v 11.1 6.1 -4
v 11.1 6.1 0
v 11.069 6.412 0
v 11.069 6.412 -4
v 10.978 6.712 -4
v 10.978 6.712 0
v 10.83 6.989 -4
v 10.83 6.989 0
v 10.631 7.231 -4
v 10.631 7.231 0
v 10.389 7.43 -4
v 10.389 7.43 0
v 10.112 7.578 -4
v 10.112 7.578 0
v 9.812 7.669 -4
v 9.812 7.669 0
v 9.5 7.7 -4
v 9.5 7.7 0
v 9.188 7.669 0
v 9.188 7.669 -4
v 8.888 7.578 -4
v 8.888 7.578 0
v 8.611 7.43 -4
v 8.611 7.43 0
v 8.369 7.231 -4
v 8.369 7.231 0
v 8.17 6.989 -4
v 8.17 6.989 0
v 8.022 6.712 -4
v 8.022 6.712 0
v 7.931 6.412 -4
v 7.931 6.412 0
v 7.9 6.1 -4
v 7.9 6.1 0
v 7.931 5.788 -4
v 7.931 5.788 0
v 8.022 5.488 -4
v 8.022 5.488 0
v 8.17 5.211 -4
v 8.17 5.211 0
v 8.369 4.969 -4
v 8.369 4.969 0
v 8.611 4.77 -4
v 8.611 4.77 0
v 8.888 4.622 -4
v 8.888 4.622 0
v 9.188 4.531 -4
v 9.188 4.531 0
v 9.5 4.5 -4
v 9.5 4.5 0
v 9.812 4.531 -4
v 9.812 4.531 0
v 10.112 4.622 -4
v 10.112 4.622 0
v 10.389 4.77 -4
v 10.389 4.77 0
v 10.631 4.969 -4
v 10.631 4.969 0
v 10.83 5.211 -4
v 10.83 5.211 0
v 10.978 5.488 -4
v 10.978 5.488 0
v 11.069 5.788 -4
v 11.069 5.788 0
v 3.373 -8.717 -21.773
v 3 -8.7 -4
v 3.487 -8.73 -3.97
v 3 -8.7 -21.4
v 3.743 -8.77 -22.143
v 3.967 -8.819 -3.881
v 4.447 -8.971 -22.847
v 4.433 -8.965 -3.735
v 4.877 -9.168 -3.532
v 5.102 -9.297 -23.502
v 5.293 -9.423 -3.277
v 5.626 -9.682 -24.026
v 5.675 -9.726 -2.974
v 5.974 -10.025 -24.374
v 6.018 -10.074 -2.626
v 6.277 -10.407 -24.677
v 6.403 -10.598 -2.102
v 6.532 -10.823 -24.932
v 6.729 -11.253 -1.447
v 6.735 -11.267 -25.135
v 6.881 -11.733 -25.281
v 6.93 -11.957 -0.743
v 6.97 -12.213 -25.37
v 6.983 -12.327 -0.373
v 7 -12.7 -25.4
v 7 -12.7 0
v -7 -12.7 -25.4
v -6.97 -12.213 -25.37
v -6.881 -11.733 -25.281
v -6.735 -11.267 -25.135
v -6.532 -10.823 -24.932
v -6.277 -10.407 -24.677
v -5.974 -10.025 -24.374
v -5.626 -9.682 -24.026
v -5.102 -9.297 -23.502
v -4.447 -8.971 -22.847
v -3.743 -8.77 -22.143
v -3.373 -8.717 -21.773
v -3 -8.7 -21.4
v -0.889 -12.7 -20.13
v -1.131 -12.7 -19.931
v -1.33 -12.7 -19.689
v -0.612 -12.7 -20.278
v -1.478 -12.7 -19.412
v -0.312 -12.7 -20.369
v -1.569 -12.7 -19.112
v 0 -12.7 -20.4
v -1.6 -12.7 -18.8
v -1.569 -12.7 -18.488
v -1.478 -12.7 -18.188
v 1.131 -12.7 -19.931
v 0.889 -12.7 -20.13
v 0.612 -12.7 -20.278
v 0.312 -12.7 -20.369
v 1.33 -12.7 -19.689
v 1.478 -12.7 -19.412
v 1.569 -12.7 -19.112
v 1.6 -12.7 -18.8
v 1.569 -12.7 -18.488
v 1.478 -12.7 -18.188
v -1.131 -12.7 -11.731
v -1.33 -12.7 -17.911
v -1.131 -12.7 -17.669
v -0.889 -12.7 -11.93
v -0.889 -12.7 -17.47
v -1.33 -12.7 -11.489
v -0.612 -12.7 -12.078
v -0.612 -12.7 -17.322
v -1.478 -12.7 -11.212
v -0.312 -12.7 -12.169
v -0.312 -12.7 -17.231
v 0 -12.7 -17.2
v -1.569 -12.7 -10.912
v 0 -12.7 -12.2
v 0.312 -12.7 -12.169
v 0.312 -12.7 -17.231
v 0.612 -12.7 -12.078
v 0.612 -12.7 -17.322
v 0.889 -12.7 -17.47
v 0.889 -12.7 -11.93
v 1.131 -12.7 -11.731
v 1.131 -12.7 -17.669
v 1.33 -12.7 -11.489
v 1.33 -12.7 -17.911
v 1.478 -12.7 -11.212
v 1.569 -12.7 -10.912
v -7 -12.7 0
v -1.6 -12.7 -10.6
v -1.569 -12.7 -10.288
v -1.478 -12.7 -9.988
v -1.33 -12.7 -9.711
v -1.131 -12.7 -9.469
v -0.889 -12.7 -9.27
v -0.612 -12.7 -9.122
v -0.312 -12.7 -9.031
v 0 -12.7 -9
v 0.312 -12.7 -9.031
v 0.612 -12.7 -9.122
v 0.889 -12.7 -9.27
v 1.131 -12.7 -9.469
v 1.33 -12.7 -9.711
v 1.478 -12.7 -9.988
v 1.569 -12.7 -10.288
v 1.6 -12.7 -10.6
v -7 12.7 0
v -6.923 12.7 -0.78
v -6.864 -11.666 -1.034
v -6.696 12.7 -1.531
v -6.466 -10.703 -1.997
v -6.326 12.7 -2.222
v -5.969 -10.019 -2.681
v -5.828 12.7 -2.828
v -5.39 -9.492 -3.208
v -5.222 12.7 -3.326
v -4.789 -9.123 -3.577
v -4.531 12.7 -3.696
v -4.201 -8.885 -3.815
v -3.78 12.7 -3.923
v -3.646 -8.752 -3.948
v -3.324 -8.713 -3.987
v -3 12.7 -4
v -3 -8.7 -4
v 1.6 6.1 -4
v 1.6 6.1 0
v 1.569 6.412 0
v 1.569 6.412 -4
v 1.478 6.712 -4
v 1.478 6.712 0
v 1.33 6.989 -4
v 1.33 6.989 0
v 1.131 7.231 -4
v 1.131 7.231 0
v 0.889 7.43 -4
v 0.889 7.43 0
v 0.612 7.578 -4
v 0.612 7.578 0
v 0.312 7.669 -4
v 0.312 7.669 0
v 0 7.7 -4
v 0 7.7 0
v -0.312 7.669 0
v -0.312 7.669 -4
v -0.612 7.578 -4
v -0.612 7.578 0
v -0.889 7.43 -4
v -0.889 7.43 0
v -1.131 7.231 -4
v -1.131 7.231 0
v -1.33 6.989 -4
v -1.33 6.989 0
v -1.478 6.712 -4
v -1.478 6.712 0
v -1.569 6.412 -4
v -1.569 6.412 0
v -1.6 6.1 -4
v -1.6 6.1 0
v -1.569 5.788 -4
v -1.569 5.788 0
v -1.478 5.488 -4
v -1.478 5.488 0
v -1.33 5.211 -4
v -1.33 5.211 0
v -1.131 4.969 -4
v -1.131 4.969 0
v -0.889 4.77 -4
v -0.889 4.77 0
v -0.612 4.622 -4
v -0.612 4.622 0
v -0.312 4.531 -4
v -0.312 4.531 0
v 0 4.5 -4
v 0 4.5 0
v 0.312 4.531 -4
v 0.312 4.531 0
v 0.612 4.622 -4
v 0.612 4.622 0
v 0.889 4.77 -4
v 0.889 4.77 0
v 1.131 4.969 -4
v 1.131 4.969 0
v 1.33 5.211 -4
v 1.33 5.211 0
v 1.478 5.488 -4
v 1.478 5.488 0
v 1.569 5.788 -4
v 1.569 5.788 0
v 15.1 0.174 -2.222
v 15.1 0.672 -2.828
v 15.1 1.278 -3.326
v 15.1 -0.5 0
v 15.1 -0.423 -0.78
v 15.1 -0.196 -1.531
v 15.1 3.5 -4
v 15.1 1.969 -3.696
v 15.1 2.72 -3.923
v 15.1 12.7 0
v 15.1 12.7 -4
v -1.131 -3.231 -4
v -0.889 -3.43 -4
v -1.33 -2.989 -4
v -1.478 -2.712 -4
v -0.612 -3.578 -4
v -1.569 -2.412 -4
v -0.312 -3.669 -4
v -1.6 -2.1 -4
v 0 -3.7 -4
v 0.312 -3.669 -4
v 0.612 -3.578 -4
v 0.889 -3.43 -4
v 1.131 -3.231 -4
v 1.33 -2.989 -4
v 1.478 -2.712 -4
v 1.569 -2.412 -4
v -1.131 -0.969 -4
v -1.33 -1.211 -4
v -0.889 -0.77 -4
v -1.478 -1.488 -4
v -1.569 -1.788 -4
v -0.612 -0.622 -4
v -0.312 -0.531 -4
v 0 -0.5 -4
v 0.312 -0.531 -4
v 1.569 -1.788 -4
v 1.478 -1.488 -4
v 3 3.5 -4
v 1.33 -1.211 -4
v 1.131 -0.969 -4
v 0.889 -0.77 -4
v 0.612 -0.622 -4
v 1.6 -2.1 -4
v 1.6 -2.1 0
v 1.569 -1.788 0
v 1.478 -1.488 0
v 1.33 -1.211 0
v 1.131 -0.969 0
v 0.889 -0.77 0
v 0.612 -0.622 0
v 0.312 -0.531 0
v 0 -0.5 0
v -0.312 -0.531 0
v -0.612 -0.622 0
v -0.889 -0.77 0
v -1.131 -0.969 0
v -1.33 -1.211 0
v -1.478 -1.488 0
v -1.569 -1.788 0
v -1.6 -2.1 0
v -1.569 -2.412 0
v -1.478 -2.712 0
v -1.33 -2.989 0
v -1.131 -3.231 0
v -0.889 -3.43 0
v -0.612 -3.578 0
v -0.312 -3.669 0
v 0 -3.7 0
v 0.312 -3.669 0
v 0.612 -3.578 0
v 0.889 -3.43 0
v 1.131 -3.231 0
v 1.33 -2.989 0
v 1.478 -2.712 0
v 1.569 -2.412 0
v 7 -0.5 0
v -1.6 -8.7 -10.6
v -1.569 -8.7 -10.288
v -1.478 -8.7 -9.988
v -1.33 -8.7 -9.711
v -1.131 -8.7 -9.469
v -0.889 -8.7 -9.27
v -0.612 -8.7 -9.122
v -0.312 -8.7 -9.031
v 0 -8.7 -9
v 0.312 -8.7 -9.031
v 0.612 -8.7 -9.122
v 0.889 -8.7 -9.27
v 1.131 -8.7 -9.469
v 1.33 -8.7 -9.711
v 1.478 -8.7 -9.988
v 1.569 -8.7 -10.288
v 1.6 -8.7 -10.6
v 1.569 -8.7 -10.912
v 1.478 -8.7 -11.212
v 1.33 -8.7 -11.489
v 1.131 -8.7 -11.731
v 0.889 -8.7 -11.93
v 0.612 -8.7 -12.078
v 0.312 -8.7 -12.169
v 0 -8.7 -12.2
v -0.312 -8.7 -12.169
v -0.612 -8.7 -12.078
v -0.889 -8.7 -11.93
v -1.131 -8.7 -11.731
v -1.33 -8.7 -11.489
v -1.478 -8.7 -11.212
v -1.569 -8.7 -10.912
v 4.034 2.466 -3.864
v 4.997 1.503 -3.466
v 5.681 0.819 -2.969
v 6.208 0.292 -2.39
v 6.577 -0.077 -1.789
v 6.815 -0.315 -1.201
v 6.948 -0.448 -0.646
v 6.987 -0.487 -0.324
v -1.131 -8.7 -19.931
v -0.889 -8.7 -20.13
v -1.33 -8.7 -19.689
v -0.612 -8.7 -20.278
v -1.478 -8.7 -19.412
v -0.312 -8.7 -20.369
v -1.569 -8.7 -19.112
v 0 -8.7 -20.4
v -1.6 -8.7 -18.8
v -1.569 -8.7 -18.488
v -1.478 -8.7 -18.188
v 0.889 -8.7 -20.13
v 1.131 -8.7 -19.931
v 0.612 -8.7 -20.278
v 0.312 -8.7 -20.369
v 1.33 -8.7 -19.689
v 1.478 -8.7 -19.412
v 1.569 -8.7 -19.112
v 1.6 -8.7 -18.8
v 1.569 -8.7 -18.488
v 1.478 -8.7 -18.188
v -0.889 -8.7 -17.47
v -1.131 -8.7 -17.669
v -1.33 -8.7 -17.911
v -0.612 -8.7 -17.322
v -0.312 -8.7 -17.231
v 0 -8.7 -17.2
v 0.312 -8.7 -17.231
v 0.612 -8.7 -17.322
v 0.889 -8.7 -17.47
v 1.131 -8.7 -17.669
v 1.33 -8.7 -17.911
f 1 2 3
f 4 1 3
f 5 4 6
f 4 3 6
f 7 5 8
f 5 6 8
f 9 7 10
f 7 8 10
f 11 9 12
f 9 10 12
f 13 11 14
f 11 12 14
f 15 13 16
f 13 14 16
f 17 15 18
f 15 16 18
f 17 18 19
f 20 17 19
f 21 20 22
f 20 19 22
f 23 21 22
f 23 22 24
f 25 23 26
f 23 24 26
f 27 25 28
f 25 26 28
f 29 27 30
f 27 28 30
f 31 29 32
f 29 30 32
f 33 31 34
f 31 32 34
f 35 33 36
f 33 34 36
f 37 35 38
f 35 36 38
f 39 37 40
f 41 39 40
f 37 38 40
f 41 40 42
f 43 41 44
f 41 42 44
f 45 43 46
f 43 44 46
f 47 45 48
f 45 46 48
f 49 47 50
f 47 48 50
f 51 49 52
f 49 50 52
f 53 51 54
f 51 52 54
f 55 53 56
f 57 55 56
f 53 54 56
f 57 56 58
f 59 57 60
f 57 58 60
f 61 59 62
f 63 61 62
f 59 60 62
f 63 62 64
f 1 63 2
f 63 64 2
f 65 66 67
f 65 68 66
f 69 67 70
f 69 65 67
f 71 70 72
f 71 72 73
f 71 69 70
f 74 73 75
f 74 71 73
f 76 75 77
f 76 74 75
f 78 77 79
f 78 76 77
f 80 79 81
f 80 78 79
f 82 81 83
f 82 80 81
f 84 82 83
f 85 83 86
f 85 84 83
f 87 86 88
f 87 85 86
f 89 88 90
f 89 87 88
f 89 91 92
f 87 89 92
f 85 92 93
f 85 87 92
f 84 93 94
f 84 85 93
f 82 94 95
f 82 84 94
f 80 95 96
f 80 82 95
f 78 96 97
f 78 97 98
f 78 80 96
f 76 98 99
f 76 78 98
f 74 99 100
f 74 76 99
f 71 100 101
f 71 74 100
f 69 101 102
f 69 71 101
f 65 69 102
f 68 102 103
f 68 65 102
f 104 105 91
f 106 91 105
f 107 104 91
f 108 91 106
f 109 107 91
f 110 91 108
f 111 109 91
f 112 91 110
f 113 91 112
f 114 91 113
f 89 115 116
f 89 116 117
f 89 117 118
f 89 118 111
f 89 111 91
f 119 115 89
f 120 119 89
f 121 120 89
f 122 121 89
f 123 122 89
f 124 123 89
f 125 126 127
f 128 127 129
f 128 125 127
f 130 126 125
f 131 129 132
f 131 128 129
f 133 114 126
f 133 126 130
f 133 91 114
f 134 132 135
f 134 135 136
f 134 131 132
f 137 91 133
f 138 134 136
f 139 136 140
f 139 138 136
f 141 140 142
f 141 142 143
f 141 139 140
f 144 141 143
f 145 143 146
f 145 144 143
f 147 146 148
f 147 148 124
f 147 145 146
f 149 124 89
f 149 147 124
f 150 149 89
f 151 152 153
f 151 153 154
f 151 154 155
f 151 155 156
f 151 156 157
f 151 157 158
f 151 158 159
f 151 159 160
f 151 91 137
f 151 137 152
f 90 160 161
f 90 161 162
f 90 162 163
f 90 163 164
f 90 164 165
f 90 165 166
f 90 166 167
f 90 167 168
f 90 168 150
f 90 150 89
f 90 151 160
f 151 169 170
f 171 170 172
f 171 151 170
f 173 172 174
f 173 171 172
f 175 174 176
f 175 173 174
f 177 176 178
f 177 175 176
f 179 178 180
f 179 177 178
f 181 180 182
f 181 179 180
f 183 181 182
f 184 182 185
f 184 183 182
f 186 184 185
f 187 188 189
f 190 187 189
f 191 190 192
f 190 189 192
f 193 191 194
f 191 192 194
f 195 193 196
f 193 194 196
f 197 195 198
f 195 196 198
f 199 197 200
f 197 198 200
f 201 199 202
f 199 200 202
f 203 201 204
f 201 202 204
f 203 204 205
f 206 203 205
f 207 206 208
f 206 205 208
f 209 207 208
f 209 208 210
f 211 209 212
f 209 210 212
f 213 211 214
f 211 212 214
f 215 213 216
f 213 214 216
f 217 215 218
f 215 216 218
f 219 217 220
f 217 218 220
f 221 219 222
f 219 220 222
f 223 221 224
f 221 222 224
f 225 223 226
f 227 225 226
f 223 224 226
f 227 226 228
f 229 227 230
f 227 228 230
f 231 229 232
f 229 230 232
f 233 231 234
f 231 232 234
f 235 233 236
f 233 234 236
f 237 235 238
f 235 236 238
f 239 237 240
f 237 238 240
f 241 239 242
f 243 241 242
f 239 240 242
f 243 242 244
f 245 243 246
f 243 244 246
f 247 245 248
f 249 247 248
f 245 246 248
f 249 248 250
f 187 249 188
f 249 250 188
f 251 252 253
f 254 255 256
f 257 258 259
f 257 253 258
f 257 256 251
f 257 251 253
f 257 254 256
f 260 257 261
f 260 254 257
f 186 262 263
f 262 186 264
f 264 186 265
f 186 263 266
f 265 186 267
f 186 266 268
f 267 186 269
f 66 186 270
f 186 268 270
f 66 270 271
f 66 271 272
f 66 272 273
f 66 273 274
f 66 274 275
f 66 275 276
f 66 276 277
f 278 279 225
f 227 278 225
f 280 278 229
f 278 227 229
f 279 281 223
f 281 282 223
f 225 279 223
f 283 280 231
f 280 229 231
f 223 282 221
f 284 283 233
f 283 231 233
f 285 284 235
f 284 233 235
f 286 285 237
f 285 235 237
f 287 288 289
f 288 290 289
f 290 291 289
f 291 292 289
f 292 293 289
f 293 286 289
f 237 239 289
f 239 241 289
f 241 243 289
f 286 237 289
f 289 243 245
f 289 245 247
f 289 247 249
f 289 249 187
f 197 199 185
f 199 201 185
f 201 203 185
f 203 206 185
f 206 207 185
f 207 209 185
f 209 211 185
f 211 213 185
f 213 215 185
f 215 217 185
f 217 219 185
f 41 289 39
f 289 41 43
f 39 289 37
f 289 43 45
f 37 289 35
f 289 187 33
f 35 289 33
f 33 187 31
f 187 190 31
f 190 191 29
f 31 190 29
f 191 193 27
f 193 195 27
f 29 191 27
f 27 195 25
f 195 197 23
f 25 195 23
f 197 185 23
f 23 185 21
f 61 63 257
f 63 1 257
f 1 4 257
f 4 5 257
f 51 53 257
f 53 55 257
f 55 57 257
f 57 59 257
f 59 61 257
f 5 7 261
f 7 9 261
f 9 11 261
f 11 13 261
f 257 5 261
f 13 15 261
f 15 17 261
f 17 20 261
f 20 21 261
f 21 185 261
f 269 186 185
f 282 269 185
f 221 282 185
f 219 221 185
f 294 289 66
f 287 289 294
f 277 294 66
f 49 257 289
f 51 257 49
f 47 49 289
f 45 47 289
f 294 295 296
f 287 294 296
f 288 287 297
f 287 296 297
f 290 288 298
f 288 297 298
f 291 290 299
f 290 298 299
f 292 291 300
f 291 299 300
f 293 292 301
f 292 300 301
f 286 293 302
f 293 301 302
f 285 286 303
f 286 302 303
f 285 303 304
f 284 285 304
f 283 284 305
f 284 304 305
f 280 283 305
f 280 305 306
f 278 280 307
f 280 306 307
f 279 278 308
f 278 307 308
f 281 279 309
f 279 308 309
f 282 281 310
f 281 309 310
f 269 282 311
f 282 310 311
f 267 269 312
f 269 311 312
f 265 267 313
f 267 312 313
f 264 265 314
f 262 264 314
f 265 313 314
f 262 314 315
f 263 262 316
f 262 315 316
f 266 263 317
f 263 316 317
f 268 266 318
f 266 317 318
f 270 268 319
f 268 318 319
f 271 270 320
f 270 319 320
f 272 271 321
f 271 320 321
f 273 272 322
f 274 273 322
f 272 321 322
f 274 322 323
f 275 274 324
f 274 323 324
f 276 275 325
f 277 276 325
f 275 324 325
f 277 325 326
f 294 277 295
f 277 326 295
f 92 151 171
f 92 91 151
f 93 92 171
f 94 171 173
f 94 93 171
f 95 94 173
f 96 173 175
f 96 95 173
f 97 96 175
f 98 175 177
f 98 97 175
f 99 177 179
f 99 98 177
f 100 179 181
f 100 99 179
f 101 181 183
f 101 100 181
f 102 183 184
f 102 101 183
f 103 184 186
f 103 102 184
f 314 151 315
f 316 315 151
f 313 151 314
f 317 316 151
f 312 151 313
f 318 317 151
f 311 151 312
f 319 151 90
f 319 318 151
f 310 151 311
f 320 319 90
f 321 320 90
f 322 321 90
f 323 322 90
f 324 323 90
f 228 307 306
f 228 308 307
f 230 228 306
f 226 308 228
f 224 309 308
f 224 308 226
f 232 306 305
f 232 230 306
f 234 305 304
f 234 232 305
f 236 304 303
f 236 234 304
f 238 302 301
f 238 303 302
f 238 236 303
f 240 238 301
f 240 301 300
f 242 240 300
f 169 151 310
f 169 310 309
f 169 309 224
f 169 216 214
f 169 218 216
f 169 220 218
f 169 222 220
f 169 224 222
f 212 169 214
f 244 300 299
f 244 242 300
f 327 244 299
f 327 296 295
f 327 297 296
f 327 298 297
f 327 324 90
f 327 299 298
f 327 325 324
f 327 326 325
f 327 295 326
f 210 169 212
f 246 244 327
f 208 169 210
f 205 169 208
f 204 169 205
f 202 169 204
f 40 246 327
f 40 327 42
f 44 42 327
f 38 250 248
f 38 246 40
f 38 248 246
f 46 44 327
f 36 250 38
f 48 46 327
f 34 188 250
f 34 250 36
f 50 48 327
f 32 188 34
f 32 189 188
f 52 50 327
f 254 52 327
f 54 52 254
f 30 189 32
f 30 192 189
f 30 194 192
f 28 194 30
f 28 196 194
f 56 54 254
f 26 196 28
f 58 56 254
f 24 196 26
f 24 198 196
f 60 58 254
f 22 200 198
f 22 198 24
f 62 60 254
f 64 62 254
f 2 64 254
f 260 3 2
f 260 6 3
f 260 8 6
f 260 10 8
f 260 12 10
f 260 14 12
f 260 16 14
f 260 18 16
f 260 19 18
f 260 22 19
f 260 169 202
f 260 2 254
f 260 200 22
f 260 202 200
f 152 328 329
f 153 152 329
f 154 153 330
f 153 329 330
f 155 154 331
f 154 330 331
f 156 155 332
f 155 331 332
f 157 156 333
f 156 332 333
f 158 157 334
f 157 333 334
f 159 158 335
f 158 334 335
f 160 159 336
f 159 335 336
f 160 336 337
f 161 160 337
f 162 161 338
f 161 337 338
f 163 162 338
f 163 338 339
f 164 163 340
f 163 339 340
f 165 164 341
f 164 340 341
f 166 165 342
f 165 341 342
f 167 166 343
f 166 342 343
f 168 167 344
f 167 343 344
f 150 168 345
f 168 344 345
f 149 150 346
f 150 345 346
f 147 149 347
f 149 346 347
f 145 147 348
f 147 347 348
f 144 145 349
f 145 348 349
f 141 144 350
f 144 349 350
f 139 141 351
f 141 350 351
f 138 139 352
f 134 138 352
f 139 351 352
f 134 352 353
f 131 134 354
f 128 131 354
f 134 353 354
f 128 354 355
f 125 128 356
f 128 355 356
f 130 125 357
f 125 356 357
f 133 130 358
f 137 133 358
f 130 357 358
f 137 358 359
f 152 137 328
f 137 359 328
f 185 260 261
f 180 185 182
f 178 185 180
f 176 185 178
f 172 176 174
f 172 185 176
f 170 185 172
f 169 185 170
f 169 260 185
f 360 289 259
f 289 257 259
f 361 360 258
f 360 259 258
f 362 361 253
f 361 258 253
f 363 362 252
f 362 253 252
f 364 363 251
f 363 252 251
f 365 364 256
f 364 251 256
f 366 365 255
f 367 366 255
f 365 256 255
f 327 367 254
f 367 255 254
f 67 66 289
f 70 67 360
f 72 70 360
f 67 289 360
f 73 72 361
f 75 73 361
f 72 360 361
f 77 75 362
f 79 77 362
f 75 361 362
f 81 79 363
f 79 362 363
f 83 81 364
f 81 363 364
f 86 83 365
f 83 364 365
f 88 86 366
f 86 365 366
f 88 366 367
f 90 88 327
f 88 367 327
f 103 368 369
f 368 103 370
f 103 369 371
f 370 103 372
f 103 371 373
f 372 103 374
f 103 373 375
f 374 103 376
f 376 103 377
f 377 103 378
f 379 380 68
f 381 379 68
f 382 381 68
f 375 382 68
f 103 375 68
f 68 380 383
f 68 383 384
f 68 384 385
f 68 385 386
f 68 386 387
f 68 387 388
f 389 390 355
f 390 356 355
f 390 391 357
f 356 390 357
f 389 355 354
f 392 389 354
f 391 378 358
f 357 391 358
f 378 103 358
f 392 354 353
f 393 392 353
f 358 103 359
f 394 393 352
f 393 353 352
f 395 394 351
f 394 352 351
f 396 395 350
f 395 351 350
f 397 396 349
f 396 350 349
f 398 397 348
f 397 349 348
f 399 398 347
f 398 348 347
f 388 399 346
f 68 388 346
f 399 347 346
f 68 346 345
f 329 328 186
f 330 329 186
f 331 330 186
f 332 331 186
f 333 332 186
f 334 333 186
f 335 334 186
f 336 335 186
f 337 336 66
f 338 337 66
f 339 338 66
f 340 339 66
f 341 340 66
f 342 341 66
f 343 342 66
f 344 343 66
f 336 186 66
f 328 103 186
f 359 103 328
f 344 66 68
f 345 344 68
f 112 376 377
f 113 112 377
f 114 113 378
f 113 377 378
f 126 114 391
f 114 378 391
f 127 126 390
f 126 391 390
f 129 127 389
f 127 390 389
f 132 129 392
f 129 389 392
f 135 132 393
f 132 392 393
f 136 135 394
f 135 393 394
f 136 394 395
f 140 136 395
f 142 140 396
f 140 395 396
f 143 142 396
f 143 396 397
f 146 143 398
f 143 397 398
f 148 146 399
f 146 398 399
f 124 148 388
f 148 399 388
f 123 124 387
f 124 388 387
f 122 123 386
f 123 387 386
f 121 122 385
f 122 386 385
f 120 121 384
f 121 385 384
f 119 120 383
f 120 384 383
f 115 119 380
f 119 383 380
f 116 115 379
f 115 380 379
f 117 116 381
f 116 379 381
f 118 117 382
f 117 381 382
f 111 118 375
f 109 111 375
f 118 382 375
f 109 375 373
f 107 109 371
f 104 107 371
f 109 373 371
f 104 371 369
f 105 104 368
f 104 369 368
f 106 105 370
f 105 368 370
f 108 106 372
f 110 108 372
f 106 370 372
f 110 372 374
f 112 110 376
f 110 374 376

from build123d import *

# Parameters (mm, degrees)
F0_R     = 1.6
F1_DEPTH = 4
F0_W     = 14
F0_H     = 4
F2_DEPTH = 25.4
F3_R     = 1.6
F4_DEPTH = 4
F5_R     = 3.99999


# Not quite as in the source:
# - a fillet or chamfer is up to 0.001 mm smaller than in the source, because OpenCascade refuses the exact size


with BuildPart() as f1:
    # F0 (on Top) → F1 (new body)
    with BuildSketch(Plane.XY):
        Polygon((7, 12.7), (-7, 12.7), (-7, -8.7), (7, -8.7), (7, -0.5), (15.1, -0.5), (15.1, 12.7), align=None)
        with Locations((0, -2.1)):
            Circle(F0_R, mode=Mode.SUBTRACT)
        with Locations((0, 6.1)):
            Circle(F0_R, mode=Mode.SUBTRACT)
        with Locations((9.5, 6.1)):
            Circle(F0_R, mode=Mode.SUBTRACT)
    extrude(amount=-F1_DEPTH)

    # F0 (on Top) → F2 (join)
    with BuildSketch(Plane.XY):
        with Locations((0, -10.7)):
            Rectangle(F0_W, F0_H)
    extrude(amount=-F2_DEPTH)

    # F3 (on face) → F4 (cut, through all)
    with BuildSketch(Plane(origin=(0, -8.7, 0), x_dir=(-1, 0, 0), z_dir=(0, 1, 0))):
        with Locations((0, -10.6)):
            Circle(F3_R)
        with Locations((0, -18.8)):
            Circle(F3_R)
    extrude(amount=-F4_DEPTH, mode=Mode.SUBTRACT)

    # F5 (radius 4 in the source; OpenCascade refuses exactly that, so slightly less here)
    f5_edges = [f1.edges().sort_by_distance(p)[0] for p in [
        (-7, -8.7, -14.7),
        (0, -8.7, -25.4),
        (7, -8.7, -14.7),
        (-7, 2, -4),
        (7, -4.6, -4),
        (11.05, -0.5, -4),
    ]]
    fillet(f5_edges, radius=F5_R)


solid = f1.part
